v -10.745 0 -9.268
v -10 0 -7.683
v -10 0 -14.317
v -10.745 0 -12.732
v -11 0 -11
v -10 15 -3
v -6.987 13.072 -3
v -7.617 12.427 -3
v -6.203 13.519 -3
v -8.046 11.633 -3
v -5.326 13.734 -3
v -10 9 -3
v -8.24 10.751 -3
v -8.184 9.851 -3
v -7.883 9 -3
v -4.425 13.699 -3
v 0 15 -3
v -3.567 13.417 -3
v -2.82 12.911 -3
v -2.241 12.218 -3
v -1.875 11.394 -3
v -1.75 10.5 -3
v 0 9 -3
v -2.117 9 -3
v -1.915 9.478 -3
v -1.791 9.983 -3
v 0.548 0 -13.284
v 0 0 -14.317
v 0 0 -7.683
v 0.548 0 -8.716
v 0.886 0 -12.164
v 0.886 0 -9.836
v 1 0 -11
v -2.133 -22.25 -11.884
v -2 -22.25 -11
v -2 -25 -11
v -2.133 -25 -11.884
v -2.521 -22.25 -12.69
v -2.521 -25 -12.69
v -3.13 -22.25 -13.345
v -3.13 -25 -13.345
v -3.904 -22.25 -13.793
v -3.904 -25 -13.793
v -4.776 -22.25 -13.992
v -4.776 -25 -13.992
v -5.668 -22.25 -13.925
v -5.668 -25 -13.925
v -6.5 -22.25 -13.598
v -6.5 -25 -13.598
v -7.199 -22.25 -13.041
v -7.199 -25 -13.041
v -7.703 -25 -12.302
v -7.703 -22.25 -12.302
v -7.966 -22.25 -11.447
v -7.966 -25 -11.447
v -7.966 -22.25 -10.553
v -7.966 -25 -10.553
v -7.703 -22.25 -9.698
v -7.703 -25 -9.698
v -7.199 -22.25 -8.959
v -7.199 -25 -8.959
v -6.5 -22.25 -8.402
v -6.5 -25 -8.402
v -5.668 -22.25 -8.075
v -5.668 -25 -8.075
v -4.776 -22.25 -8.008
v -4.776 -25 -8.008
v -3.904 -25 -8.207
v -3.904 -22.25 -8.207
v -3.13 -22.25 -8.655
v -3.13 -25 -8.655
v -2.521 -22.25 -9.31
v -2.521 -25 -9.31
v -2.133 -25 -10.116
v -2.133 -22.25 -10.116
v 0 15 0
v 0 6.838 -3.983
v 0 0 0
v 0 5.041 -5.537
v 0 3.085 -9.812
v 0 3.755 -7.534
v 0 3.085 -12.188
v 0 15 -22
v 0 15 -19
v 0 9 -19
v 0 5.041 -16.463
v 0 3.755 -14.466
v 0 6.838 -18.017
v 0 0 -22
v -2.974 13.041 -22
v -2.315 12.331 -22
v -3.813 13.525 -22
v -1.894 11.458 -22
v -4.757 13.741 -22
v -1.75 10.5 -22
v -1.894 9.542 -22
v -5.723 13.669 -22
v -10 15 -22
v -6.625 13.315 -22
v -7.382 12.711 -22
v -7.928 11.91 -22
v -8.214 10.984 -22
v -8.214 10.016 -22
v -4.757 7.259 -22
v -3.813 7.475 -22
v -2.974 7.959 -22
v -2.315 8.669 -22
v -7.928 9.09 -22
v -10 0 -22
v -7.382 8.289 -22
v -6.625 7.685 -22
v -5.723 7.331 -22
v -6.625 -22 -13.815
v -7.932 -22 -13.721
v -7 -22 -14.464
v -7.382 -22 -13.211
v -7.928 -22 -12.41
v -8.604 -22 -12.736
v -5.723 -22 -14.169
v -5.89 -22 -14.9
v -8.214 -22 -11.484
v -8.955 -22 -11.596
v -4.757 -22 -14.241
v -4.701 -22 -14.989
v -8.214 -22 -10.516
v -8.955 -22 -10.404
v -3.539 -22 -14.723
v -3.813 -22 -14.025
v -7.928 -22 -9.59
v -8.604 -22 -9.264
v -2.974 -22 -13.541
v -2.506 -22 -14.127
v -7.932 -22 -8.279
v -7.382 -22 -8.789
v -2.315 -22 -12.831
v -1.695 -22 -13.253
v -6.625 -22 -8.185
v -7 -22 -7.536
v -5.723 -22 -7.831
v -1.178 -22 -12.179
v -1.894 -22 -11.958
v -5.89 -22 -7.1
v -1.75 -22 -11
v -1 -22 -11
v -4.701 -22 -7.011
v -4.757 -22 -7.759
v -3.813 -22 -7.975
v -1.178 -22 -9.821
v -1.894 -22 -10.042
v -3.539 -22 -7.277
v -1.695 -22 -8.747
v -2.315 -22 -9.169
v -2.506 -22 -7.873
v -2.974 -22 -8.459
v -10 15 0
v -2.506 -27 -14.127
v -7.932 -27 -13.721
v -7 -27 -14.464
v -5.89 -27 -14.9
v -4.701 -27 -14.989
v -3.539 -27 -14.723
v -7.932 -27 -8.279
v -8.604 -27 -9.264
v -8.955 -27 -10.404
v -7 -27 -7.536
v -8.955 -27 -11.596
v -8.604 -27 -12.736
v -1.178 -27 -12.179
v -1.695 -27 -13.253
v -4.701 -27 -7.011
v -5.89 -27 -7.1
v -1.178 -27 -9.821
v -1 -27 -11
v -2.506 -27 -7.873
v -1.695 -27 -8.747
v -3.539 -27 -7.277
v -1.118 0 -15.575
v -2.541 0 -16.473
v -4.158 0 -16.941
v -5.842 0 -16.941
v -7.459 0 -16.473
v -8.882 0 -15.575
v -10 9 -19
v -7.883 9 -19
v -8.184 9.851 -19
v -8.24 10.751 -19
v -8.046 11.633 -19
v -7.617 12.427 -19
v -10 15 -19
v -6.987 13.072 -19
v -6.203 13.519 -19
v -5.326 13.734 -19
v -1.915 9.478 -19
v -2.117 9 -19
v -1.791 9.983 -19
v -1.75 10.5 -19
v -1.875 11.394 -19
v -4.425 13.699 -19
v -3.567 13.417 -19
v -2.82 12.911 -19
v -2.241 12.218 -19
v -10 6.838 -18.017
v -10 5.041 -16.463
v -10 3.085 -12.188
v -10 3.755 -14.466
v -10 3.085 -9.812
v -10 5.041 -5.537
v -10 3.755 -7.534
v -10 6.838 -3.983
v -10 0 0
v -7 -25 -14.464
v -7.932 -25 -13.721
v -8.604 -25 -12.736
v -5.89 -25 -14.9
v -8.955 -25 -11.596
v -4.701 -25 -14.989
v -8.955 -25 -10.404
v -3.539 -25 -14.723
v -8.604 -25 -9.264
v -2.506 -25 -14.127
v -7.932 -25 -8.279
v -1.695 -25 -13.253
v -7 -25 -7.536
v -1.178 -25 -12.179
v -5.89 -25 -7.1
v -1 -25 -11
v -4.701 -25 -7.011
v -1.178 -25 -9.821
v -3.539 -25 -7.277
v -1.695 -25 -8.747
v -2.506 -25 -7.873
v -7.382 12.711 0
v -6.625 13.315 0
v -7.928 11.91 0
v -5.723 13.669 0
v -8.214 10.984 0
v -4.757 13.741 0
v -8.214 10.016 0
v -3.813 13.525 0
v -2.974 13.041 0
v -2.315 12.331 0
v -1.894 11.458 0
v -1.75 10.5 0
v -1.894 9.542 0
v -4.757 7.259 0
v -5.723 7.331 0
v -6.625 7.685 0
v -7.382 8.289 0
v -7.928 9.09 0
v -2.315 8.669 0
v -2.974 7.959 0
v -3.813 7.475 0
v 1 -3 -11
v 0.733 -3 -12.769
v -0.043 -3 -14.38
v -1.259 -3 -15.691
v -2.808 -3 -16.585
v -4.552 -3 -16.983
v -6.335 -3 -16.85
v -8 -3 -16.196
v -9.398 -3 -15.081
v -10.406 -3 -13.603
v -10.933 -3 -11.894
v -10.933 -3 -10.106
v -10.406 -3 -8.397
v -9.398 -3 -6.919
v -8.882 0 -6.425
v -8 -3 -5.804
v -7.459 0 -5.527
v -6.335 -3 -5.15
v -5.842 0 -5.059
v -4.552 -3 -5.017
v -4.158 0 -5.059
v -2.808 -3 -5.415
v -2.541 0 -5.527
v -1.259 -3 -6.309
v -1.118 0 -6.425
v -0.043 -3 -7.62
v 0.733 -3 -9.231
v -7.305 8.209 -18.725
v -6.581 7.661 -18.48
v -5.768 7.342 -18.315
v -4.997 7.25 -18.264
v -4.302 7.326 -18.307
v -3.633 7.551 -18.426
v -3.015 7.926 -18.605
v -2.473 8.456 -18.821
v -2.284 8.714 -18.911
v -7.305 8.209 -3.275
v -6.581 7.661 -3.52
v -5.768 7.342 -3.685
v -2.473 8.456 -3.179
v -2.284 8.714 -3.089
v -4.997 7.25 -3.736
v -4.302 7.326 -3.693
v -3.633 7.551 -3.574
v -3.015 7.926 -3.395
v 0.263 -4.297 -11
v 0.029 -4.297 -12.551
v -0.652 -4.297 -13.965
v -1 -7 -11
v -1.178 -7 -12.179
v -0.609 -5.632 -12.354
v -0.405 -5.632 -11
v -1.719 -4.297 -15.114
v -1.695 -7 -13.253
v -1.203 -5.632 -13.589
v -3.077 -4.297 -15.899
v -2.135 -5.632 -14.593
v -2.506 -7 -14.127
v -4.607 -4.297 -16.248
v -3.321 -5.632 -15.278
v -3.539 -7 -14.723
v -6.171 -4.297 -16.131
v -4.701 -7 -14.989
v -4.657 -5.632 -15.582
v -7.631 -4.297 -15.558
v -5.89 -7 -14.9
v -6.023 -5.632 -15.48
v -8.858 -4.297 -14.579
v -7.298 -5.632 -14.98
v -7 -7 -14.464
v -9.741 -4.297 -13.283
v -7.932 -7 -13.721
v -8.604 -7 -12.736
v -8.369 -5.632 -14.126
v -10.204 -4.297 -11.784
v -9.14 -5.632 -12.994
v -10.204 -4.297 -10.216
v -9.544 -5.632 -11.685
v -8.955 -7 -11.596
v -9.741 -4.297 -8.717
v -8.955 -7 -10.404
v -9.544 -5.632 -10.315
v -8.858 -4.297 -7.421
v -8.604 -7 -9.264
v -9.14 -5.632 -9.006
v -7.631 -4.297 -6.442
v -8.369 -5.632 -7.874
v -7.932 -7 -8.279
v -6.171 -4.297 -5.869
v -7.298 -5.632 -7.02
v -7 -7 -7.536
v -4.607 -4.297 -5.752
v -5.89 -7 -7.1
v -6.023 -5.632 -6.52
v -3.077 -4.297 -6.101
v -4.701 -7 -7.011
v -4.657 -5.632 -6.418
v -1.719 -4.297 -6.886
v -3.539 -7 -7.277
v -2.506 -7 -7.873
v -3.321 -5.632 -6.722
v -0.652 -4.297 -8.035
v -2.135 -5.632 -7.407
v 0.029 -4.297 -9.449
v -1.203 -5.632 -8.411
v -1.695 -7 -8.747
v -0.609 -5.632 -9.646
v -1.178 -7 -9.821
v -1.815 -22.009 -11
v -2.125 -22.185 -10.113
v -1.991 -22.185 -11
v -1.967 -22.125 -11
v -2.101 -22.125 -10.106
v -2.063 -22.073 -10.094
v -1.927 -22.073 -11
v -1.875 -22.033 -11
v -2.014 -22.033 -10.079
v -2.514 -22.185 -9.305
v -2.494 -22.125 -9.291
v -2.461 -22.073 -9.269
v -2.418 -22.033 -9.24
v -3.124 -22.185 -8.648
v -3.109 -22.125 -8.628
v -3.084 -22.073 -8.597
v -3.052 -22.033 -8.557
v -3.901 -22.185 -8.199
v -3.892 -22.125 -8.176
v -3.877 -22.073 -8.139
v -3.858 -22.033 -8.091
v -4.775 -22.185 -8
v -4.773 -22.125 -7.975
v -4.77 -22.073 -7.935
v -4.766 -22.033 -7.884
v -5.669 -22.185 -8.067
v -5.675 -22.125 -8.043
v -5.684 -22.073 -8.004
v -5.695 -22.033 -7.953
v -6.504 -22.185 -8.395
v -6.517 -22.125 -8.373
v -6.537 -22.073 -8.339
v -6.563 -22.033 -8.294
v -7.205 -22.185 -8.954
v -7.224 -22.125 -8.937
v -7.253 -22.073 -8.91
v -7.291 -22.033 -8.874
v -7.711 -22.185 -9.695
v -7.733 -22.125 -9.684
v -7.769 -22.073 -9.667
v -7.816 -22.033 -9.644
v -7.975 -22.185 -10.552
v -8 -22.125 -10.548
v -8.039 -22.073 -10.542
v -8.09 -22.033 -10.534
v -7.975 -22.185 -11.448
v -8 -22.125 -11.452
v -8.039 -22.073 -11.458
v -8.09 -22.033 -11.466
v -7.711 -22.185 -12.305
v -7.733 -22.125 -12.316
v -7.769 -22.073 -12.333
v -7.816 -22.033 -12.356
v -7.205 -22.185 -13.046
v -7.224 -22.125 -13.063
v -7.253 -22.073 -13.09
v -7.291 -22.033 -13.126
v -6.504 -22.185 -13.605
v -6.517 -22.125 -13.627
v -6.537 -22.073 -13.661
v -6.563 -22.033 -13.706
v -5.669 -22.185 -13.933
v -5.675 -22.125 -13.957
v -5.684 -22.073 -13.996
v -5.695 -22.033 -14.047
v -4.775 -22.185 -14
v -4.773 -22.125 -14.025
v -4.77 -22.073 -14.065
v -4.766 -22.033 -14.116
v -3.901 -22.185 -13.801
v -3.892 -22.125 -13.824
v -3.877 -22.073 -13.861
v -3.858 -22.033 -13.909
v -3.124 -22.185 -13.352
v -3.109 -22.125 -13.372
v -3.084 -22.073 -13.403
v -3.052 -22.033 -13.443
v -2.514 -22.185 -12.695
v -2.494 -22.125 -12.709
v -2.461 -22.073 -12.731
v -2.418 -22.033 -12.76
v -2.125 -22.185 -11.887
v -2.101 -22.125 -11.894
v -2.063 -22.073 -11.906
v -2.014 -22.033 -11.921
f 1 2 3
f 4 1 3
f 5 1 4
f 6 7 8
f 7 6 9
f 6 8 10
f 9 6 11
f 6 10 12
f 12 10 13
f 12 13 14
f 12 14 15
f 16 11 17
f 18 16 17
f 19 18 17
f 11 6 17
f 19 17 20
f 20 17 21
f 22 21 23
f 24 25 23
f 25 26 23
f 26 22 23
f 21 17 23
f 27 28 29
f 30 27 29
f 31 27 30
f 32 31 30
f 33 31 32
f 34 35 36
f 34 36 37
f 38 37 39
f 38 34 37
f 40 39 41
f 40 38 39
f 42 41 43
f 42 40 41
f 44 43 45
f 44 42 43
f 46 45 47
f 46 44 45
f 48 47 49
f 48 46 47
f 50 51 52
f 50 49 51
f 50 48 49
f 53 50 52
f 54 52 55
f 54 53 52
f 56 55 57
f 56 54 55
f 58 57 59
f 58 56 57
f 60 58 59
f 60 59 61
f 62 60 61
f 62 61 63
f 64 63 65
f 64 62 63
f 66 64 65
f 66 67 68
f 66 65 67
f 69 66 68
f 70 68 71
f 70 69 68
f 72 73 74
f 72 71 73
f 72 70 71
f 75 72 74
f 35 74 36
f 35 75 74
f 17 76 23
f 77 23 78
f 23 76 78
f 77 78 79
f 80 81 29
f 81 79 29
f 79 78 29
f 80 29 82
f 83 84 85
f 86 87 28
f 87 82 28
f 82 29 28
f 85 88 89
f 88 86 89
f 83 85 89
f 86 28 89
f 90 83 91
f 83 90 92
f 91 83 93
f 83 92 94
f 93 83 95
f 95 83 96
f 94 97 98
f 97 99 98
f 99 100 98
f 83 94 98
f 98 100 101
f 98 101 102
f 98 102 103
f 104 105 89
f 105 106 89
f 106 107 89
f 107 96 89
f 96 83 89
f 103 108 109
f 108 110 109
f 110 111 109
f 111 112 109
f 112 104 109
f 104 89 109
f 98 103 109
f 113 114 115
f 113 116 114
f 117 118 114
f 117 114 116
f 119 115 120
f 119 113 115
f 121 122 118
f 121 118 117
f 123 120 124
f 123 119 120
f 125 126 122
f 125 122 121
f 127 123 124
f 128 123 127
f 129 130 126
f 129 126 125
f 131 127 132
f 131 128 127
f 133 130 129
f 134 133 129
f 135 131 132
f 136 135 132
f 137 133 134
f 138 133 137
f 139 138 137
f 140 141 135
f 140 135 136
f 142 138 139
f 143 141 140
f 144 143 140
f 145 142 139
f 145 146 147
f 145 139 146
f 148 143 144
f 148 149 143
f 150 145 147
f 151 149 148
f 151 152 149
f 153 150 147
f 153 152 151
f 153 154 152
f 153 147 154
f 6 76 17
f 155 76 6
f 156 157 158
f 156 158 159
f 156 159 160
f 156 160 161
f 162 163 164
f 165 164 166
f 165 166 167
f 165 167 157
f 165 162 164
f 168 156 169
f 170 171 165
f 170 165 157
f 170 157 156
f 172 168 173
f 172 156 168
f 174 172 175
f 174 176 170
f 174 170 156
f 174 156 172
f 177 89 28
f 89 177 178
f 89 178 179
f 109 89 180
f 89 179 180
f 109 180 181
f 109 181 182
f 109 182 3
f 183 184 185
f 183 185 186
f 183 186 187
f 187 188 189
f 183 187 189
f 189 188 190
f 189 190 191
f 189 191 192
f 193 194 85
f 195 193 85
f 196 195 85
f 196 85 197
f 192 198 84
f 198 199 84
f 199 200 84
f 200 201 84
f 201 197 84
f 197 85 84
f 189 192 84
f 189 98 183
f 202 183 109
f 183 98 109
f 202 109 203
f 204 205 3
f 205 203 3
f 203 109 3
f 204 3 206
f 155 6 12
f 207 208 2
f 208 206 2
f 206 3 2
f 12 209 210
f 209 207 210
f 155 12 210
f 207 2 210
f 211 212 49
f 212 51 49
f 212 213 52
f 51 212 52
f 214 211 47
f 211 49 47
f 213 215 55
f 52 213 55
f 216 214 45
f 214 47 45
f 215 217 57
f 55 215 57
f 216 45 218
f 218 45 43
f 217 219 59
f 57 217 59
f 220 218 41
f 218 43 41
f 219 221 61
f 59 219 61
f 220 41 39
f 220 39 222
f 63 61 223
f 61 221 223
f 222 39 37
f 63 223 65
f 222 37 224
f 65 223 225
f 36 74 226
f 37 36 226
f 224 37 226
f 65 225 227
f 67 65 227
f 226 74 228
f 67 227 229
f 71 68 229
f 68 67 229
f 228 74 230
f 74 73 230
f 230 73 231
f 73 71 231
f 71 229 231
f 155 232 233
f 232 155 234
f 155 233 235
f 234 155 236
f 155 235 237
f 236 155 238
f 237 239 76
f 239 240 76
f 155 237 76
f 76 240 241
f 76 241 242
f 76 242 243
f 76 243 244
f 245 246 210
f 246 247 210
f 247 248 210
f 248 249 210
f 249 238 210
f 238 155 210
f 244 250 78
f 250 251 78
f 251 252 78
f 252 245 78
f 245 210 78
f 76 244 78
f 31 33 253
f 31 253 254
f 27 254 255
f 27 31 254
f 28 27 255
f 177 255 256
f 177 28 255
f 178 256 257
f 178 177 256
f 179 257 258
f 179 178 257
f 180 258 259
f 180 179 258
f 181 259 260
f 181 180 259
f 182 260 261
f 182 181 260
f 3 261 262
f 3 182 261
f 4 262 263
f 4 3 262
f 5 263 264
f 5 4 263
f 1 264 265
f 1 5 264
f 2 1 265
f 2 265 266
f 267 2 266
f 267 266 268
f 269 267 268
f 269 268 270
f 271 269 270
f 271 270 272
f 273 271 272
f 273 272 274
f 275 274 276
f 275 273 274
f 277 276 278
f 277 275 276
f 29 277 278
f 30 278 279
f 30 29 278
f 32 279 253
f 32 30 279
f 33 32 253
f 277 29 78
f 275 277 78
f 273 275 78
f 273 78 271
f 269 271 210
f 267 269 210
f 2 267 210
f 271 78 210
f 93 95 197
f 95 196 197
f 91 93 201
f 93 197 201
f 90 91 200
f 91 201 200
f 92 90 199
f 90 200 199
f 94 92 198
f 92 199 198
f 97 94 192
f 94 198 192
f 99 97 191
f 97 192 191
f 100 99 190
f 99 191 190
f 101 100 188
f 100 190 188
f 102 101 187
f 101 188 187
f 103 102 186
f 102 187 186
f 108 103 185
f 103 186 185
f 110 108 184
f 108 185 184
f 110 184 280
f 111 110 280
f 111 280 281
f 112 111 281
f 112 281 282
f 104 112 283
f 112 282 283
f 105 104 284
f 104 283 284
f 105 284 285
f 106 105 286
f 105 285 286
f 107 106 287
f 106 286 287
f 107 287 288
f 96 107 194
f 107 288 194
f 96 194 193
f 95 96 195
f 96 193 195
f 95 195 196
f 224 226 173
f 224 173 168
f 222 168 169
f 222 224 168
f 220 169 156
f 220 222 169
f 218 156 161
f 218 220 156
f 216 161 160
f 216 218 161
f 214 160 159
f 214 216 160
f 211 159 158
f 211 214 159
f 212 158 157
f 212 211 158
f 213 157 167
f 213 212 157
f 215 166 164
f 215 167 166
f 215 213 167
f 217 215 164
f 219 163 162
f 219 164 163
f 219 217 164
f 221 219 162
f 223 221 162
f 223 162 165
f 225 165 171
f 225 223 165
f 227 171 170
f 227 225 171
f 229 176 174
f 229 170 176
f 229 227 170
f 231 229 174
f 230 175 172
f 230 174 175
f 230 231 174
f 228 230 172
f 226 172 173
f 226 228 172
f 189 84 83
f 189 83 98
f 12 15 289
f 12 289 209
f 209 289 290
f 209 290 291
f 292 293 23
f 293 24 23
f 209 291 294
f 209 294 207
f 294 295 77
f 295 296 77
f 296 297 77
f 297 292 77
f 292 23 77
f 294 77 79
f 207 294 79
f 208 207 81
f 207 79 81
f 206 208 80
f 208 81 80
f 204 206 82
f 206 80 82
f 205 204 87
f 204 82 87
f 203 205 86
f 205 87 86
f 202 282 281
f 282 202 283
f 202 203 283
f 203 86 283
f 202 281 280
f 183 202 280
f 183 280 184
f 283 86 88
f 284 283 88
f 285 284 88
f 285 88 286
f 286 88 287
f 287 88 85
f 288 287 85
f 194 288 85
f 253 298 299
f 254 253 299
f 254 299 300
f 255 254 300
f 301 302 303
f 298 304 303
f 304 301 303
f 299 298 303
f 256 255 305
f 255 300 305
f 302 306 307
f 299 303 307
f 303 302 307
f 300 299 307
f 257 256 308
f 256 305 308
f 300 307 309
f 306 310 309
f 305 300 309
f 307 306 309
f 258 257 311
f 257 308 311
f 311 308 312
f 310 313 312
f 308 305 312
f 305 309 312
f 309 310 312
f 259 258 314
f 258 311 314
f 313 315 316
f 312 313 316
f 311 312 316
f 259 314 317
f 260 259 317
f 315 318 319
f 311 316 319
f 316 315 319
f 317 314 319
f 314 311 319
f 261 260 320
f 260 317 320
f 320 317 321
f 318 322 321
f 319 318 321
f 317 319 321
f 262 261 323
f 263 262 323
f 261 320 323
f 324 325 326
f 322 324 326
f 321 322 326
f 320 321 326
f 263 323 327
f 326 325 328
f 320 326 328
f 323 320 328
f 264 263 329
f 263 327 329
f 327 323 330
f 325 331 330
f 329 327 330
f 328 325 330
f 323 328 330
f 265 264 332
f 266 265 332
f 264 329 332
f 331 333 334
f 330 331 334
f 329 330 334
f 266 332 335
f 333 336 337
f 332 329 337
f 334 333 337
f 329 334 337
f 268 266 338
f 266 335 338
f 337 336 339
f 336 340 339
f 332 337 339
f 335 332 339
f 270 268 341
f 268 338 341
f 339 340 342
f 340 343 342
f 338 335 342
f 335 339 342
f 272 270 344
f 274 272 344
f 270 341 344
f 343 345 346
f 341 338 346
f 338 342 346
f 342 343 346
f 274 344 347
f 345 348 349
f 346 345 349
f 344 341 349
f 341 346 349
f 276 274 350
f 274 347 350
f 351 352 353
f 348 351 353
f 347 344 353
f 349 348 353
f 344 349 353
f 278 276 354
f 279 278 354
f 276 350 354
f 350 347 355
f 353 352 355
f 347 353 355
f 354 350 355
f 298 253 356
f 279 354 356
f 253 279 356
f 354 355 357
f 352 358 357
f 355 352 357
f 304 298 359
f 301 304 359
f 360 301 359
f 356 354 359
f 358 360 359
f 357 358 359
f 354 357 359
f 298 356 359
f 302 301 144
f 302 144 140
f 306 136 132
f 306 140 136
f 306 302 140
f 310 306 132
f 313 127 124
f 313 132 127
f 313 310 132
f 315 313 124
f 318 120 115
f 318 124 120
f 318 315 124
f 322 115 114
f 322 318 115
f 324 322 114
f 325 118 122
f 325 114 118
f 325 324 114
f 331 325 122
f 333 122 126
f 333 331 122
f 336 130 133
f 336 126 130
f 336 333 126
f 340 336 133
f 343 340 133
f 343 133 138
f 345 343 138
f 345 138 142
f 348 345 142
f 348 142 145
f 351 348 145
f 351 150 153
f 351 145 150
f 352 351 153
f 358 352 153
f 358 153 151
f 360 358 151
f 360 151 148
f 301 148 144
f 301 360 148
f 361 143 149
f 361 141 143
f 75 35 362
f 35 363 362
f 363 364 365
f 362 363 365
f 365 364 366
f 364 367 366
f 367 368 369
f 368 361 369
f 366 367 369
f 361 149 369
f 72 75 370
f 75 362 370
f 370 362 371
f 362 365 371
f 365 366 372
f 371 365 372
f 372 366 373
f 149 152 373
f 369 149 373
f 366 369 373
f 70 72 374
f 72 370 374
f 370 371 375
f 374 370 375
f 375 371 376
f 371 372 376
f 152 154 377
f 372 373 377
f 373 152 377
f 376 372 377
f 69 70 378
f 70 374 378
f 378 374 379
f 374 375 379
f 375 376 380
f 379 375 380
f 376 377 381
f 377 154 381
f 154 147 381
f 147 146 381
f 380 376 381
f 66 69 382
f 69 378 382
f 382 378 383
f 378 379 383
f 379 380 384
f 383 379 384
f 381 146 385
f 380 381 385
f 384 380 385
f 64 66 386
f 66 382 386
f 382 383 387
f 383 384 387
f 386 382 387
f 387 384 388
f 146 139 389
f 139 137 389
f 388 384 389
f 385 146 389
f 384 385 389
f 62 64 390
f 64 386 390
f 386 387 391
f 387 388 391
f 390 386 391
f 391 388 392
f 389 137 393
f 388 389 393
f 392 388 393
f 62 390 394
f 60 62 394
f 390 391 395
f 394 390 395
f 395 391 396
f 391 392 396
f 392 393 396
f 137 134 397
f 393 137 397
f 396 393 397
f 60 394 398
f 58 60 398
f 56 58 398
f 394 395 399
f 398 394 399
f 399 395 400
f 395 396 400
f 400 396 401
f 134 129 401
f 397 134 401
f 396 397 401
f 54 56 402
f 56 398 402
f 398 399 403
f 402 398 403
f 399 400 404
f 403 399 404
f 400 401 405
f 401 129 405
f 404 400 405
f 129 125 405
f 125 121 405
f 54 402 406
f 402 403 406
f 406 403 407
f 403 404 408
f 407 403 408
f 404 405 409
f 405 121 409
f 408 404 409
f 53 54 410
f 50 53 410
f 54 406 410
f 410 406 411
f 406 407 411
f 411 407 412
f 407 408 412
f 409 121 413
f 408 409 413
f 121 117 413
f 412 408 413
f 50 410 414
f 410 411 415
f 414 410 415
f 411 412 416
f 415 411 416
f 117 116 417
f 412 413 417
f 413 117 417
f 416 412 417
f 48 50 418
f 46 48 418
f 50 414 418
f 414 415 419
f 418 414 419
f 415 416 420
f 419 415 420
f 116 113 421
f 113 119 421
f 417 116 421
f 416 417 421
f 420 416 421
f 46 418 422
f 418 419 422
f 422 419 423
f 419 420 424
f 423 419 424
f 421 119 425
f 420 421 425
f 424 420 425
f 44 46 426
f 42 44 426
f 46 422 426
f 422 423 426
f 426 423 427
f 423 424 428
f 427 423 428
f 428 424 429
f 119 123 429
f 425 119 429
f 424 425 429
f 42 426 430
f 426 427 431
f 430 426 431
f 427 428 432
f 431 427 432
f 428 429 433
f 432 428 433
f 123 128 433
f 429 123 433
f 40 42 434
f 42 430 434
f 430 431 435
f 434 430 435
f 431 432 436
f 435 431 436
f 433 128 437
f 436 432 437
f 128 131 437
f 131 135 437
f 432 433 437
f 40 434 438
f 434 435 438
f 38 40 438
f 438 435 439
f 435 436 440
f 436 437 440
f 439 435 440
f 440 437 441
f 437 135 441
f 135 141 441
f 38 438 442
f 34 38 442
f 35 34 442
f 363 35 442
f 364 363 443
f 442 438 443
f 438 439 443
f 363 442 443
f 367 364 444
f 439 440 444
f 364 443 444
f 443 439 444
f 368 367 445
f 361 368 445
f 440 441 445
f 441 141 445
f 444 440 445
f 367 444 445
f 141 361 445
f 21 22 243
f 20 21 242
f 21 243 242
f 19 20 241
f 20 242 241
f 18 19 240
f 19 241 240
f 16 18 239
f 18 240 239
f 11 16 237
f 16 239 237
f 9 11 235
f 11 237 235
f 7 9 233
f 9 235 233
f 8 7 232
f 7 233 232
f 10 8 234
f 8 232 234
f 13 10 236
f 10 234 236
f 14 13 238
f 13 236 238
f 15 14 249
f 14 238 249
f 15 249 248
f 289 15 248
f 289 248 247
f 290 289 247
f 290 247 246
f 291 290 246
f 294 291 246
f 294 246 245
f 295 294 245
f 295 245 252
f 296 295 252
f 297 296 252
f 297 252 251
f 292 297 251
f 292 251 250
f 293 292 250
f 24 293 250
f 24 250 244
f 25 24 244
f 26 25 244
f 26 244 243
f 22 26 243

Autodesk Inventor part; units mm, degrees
ref_plane "YZ Plane" through (0, 0, 0) normal (1, 0, 0) x (0, 1, 0)
ref_plane "XZ Plane" through (0, 0, 0) normal (0, 1, 0) x (-1, 0, 0)
ref_plane "XY Plane" through (0, 0, 0) normal (0, 0, 1) x (1, 0, 0)
sketch "Sketch1" plane through (0, 0, 0) normal (0, 0, 1) x (1, 0, 0)
  point P0 (0, 0)
sketch "Sketch2" plane through (0, 0, 0) normal (0, 1, 0) x (-1, 0, 0)
  line L0 (0, 0) -> (0, -22)
  line L1 (0, -22) -> (10, -22)
  line L2 (10, -22) -> (10, 0)
  line L3 (10, 0) -> (0, 0)
  dimension "d0" = 22
  dimension "d1" = 10
extrude "Extrusion1" add sketch "Sketch2" along normal blind 15
sketch "Sketch5" plane through (0, 0, 0) normal (1, 0, 0) x (0, 0, -1)
  line L0 (0, 0) -> (22, 0) projected
  line L1 (22, 0) -> (22, 15) projected
  line L2 (0, 15) -> (22, 15) projected
  line L3 (0, 0) -> (0, 15) projected
  line L4 (22, 15) -> (0, 15) projected
  line L5 (0, 15) -> (3, 15)
  line L6 (22, 15) -> (19, 15)
  line L7 (22, 0) -> (0, 0) projected
  line L8 (11, 0) -> (11, 3)
  line L9 (3, 15) -> (3, 9)
  line L10 (3, 9) -> (19, 9)
  line L11 (19, 9) -> (19, 15)
  arc A0 (3, 9) -> (19, 9) centre (11, 11.3333) ccw
  dimension "d4" = 3
  dimension "d5" = 3
  dimension "d7" = 3
  dimension "d8" = 6
extrude "Extrusion2" cut sketch "Sketch5" against normal blind 17 contours A0 L10 | L2 L11 L10 L9
sketch "Sketch6" plane through (-10, 0, 0) normal (0, 0, 1) x (1, 0, 0)
  line L0 (0, 0) -> (10, 0) projected
  line L1 (10, 0) -> (10, 15) projected
  line L2 (0, 15) -> (10, 15) projected
  line L3 (0, 0) -> (0, 15) projected
  line L4 (0, 15) -> (10, 15) projected
  line L5 (5, 15) -> (5, 10.5)
  circle A0 centre (5, 10.5) radius 3.25
  dimension "d11" = 4.5
  dimension "d30" = 6.5
extrude "Extrusion3" cut sketch "Sketch6" against normal blind 31.25 contours A0
sketch "Sketch7" plane through (0, 0, 0) normal (0, -1, 0) x (1, 0, 0)
  line L0 (0, -22) -> (-10, -22) projected
  line L1 (0, 0) -> (0, -22) projected
  line L2 (-10, 0) -> (0, 0) projected
  line L3 (-10, -22) -> (-10, 0) projected
  line L4 (0, -3) -> (0, -19) projected
  circle A0 centre (-5, -11) radius 6
  dimension "d15" = 12
extrude "Extrusion4" add sketch "Sketch7" along normal blind 3 contours A0 L3 | L3 A0 L1 | L1 A0
sketch "Sketch8" plane through (-5, -3, -11) normal (0, -1, 0) x (1, 0, 0)
  circle A0 centre (0, 0) radius 6 projected
  circle A1 centre (0, 0) radius 4
  point P0 (5, 11)
  dimension "d18" = 8
extrude "Extrusion5" add sketch "Sketch8" along normal blind 4 contours A1
fillet "Fillet1" radius 28 1 edges at (-9, -3, -11)
sketch "Sketch11" plane through (-5, -7, -11) normal (0, -1, 0) x (1, 0, 0)
  circle A0 centre (0, 0) radius 4
  point P0 (5, 11)
extrude "Extrusion6" add sketch "Sketch11" along normal blind 15
sketch "Sketch12" plane through (-5, -22, -11) normal (0, -1, 0) x (1, 0, 0)
  circle A0 centre (0, 0) radius 3
  point P0 (5, 11)
  dimension "d24" = 6
extrude "Extrusion7" add sketch "Sketch12" along normal blind 3
sketch "Sketch13" plane through (-5, -25, -11) normal (0, -1, 0) x (1, 0, 0)
  circle A0 centre (0, 0) radius 4
  point P0 (5, 11)
extrude "Extrusion8" add sketch "Sketch13" along normal blind 2
fillet "Fillet2" radius 0.25 1 edges at (-8, -22, -11)
